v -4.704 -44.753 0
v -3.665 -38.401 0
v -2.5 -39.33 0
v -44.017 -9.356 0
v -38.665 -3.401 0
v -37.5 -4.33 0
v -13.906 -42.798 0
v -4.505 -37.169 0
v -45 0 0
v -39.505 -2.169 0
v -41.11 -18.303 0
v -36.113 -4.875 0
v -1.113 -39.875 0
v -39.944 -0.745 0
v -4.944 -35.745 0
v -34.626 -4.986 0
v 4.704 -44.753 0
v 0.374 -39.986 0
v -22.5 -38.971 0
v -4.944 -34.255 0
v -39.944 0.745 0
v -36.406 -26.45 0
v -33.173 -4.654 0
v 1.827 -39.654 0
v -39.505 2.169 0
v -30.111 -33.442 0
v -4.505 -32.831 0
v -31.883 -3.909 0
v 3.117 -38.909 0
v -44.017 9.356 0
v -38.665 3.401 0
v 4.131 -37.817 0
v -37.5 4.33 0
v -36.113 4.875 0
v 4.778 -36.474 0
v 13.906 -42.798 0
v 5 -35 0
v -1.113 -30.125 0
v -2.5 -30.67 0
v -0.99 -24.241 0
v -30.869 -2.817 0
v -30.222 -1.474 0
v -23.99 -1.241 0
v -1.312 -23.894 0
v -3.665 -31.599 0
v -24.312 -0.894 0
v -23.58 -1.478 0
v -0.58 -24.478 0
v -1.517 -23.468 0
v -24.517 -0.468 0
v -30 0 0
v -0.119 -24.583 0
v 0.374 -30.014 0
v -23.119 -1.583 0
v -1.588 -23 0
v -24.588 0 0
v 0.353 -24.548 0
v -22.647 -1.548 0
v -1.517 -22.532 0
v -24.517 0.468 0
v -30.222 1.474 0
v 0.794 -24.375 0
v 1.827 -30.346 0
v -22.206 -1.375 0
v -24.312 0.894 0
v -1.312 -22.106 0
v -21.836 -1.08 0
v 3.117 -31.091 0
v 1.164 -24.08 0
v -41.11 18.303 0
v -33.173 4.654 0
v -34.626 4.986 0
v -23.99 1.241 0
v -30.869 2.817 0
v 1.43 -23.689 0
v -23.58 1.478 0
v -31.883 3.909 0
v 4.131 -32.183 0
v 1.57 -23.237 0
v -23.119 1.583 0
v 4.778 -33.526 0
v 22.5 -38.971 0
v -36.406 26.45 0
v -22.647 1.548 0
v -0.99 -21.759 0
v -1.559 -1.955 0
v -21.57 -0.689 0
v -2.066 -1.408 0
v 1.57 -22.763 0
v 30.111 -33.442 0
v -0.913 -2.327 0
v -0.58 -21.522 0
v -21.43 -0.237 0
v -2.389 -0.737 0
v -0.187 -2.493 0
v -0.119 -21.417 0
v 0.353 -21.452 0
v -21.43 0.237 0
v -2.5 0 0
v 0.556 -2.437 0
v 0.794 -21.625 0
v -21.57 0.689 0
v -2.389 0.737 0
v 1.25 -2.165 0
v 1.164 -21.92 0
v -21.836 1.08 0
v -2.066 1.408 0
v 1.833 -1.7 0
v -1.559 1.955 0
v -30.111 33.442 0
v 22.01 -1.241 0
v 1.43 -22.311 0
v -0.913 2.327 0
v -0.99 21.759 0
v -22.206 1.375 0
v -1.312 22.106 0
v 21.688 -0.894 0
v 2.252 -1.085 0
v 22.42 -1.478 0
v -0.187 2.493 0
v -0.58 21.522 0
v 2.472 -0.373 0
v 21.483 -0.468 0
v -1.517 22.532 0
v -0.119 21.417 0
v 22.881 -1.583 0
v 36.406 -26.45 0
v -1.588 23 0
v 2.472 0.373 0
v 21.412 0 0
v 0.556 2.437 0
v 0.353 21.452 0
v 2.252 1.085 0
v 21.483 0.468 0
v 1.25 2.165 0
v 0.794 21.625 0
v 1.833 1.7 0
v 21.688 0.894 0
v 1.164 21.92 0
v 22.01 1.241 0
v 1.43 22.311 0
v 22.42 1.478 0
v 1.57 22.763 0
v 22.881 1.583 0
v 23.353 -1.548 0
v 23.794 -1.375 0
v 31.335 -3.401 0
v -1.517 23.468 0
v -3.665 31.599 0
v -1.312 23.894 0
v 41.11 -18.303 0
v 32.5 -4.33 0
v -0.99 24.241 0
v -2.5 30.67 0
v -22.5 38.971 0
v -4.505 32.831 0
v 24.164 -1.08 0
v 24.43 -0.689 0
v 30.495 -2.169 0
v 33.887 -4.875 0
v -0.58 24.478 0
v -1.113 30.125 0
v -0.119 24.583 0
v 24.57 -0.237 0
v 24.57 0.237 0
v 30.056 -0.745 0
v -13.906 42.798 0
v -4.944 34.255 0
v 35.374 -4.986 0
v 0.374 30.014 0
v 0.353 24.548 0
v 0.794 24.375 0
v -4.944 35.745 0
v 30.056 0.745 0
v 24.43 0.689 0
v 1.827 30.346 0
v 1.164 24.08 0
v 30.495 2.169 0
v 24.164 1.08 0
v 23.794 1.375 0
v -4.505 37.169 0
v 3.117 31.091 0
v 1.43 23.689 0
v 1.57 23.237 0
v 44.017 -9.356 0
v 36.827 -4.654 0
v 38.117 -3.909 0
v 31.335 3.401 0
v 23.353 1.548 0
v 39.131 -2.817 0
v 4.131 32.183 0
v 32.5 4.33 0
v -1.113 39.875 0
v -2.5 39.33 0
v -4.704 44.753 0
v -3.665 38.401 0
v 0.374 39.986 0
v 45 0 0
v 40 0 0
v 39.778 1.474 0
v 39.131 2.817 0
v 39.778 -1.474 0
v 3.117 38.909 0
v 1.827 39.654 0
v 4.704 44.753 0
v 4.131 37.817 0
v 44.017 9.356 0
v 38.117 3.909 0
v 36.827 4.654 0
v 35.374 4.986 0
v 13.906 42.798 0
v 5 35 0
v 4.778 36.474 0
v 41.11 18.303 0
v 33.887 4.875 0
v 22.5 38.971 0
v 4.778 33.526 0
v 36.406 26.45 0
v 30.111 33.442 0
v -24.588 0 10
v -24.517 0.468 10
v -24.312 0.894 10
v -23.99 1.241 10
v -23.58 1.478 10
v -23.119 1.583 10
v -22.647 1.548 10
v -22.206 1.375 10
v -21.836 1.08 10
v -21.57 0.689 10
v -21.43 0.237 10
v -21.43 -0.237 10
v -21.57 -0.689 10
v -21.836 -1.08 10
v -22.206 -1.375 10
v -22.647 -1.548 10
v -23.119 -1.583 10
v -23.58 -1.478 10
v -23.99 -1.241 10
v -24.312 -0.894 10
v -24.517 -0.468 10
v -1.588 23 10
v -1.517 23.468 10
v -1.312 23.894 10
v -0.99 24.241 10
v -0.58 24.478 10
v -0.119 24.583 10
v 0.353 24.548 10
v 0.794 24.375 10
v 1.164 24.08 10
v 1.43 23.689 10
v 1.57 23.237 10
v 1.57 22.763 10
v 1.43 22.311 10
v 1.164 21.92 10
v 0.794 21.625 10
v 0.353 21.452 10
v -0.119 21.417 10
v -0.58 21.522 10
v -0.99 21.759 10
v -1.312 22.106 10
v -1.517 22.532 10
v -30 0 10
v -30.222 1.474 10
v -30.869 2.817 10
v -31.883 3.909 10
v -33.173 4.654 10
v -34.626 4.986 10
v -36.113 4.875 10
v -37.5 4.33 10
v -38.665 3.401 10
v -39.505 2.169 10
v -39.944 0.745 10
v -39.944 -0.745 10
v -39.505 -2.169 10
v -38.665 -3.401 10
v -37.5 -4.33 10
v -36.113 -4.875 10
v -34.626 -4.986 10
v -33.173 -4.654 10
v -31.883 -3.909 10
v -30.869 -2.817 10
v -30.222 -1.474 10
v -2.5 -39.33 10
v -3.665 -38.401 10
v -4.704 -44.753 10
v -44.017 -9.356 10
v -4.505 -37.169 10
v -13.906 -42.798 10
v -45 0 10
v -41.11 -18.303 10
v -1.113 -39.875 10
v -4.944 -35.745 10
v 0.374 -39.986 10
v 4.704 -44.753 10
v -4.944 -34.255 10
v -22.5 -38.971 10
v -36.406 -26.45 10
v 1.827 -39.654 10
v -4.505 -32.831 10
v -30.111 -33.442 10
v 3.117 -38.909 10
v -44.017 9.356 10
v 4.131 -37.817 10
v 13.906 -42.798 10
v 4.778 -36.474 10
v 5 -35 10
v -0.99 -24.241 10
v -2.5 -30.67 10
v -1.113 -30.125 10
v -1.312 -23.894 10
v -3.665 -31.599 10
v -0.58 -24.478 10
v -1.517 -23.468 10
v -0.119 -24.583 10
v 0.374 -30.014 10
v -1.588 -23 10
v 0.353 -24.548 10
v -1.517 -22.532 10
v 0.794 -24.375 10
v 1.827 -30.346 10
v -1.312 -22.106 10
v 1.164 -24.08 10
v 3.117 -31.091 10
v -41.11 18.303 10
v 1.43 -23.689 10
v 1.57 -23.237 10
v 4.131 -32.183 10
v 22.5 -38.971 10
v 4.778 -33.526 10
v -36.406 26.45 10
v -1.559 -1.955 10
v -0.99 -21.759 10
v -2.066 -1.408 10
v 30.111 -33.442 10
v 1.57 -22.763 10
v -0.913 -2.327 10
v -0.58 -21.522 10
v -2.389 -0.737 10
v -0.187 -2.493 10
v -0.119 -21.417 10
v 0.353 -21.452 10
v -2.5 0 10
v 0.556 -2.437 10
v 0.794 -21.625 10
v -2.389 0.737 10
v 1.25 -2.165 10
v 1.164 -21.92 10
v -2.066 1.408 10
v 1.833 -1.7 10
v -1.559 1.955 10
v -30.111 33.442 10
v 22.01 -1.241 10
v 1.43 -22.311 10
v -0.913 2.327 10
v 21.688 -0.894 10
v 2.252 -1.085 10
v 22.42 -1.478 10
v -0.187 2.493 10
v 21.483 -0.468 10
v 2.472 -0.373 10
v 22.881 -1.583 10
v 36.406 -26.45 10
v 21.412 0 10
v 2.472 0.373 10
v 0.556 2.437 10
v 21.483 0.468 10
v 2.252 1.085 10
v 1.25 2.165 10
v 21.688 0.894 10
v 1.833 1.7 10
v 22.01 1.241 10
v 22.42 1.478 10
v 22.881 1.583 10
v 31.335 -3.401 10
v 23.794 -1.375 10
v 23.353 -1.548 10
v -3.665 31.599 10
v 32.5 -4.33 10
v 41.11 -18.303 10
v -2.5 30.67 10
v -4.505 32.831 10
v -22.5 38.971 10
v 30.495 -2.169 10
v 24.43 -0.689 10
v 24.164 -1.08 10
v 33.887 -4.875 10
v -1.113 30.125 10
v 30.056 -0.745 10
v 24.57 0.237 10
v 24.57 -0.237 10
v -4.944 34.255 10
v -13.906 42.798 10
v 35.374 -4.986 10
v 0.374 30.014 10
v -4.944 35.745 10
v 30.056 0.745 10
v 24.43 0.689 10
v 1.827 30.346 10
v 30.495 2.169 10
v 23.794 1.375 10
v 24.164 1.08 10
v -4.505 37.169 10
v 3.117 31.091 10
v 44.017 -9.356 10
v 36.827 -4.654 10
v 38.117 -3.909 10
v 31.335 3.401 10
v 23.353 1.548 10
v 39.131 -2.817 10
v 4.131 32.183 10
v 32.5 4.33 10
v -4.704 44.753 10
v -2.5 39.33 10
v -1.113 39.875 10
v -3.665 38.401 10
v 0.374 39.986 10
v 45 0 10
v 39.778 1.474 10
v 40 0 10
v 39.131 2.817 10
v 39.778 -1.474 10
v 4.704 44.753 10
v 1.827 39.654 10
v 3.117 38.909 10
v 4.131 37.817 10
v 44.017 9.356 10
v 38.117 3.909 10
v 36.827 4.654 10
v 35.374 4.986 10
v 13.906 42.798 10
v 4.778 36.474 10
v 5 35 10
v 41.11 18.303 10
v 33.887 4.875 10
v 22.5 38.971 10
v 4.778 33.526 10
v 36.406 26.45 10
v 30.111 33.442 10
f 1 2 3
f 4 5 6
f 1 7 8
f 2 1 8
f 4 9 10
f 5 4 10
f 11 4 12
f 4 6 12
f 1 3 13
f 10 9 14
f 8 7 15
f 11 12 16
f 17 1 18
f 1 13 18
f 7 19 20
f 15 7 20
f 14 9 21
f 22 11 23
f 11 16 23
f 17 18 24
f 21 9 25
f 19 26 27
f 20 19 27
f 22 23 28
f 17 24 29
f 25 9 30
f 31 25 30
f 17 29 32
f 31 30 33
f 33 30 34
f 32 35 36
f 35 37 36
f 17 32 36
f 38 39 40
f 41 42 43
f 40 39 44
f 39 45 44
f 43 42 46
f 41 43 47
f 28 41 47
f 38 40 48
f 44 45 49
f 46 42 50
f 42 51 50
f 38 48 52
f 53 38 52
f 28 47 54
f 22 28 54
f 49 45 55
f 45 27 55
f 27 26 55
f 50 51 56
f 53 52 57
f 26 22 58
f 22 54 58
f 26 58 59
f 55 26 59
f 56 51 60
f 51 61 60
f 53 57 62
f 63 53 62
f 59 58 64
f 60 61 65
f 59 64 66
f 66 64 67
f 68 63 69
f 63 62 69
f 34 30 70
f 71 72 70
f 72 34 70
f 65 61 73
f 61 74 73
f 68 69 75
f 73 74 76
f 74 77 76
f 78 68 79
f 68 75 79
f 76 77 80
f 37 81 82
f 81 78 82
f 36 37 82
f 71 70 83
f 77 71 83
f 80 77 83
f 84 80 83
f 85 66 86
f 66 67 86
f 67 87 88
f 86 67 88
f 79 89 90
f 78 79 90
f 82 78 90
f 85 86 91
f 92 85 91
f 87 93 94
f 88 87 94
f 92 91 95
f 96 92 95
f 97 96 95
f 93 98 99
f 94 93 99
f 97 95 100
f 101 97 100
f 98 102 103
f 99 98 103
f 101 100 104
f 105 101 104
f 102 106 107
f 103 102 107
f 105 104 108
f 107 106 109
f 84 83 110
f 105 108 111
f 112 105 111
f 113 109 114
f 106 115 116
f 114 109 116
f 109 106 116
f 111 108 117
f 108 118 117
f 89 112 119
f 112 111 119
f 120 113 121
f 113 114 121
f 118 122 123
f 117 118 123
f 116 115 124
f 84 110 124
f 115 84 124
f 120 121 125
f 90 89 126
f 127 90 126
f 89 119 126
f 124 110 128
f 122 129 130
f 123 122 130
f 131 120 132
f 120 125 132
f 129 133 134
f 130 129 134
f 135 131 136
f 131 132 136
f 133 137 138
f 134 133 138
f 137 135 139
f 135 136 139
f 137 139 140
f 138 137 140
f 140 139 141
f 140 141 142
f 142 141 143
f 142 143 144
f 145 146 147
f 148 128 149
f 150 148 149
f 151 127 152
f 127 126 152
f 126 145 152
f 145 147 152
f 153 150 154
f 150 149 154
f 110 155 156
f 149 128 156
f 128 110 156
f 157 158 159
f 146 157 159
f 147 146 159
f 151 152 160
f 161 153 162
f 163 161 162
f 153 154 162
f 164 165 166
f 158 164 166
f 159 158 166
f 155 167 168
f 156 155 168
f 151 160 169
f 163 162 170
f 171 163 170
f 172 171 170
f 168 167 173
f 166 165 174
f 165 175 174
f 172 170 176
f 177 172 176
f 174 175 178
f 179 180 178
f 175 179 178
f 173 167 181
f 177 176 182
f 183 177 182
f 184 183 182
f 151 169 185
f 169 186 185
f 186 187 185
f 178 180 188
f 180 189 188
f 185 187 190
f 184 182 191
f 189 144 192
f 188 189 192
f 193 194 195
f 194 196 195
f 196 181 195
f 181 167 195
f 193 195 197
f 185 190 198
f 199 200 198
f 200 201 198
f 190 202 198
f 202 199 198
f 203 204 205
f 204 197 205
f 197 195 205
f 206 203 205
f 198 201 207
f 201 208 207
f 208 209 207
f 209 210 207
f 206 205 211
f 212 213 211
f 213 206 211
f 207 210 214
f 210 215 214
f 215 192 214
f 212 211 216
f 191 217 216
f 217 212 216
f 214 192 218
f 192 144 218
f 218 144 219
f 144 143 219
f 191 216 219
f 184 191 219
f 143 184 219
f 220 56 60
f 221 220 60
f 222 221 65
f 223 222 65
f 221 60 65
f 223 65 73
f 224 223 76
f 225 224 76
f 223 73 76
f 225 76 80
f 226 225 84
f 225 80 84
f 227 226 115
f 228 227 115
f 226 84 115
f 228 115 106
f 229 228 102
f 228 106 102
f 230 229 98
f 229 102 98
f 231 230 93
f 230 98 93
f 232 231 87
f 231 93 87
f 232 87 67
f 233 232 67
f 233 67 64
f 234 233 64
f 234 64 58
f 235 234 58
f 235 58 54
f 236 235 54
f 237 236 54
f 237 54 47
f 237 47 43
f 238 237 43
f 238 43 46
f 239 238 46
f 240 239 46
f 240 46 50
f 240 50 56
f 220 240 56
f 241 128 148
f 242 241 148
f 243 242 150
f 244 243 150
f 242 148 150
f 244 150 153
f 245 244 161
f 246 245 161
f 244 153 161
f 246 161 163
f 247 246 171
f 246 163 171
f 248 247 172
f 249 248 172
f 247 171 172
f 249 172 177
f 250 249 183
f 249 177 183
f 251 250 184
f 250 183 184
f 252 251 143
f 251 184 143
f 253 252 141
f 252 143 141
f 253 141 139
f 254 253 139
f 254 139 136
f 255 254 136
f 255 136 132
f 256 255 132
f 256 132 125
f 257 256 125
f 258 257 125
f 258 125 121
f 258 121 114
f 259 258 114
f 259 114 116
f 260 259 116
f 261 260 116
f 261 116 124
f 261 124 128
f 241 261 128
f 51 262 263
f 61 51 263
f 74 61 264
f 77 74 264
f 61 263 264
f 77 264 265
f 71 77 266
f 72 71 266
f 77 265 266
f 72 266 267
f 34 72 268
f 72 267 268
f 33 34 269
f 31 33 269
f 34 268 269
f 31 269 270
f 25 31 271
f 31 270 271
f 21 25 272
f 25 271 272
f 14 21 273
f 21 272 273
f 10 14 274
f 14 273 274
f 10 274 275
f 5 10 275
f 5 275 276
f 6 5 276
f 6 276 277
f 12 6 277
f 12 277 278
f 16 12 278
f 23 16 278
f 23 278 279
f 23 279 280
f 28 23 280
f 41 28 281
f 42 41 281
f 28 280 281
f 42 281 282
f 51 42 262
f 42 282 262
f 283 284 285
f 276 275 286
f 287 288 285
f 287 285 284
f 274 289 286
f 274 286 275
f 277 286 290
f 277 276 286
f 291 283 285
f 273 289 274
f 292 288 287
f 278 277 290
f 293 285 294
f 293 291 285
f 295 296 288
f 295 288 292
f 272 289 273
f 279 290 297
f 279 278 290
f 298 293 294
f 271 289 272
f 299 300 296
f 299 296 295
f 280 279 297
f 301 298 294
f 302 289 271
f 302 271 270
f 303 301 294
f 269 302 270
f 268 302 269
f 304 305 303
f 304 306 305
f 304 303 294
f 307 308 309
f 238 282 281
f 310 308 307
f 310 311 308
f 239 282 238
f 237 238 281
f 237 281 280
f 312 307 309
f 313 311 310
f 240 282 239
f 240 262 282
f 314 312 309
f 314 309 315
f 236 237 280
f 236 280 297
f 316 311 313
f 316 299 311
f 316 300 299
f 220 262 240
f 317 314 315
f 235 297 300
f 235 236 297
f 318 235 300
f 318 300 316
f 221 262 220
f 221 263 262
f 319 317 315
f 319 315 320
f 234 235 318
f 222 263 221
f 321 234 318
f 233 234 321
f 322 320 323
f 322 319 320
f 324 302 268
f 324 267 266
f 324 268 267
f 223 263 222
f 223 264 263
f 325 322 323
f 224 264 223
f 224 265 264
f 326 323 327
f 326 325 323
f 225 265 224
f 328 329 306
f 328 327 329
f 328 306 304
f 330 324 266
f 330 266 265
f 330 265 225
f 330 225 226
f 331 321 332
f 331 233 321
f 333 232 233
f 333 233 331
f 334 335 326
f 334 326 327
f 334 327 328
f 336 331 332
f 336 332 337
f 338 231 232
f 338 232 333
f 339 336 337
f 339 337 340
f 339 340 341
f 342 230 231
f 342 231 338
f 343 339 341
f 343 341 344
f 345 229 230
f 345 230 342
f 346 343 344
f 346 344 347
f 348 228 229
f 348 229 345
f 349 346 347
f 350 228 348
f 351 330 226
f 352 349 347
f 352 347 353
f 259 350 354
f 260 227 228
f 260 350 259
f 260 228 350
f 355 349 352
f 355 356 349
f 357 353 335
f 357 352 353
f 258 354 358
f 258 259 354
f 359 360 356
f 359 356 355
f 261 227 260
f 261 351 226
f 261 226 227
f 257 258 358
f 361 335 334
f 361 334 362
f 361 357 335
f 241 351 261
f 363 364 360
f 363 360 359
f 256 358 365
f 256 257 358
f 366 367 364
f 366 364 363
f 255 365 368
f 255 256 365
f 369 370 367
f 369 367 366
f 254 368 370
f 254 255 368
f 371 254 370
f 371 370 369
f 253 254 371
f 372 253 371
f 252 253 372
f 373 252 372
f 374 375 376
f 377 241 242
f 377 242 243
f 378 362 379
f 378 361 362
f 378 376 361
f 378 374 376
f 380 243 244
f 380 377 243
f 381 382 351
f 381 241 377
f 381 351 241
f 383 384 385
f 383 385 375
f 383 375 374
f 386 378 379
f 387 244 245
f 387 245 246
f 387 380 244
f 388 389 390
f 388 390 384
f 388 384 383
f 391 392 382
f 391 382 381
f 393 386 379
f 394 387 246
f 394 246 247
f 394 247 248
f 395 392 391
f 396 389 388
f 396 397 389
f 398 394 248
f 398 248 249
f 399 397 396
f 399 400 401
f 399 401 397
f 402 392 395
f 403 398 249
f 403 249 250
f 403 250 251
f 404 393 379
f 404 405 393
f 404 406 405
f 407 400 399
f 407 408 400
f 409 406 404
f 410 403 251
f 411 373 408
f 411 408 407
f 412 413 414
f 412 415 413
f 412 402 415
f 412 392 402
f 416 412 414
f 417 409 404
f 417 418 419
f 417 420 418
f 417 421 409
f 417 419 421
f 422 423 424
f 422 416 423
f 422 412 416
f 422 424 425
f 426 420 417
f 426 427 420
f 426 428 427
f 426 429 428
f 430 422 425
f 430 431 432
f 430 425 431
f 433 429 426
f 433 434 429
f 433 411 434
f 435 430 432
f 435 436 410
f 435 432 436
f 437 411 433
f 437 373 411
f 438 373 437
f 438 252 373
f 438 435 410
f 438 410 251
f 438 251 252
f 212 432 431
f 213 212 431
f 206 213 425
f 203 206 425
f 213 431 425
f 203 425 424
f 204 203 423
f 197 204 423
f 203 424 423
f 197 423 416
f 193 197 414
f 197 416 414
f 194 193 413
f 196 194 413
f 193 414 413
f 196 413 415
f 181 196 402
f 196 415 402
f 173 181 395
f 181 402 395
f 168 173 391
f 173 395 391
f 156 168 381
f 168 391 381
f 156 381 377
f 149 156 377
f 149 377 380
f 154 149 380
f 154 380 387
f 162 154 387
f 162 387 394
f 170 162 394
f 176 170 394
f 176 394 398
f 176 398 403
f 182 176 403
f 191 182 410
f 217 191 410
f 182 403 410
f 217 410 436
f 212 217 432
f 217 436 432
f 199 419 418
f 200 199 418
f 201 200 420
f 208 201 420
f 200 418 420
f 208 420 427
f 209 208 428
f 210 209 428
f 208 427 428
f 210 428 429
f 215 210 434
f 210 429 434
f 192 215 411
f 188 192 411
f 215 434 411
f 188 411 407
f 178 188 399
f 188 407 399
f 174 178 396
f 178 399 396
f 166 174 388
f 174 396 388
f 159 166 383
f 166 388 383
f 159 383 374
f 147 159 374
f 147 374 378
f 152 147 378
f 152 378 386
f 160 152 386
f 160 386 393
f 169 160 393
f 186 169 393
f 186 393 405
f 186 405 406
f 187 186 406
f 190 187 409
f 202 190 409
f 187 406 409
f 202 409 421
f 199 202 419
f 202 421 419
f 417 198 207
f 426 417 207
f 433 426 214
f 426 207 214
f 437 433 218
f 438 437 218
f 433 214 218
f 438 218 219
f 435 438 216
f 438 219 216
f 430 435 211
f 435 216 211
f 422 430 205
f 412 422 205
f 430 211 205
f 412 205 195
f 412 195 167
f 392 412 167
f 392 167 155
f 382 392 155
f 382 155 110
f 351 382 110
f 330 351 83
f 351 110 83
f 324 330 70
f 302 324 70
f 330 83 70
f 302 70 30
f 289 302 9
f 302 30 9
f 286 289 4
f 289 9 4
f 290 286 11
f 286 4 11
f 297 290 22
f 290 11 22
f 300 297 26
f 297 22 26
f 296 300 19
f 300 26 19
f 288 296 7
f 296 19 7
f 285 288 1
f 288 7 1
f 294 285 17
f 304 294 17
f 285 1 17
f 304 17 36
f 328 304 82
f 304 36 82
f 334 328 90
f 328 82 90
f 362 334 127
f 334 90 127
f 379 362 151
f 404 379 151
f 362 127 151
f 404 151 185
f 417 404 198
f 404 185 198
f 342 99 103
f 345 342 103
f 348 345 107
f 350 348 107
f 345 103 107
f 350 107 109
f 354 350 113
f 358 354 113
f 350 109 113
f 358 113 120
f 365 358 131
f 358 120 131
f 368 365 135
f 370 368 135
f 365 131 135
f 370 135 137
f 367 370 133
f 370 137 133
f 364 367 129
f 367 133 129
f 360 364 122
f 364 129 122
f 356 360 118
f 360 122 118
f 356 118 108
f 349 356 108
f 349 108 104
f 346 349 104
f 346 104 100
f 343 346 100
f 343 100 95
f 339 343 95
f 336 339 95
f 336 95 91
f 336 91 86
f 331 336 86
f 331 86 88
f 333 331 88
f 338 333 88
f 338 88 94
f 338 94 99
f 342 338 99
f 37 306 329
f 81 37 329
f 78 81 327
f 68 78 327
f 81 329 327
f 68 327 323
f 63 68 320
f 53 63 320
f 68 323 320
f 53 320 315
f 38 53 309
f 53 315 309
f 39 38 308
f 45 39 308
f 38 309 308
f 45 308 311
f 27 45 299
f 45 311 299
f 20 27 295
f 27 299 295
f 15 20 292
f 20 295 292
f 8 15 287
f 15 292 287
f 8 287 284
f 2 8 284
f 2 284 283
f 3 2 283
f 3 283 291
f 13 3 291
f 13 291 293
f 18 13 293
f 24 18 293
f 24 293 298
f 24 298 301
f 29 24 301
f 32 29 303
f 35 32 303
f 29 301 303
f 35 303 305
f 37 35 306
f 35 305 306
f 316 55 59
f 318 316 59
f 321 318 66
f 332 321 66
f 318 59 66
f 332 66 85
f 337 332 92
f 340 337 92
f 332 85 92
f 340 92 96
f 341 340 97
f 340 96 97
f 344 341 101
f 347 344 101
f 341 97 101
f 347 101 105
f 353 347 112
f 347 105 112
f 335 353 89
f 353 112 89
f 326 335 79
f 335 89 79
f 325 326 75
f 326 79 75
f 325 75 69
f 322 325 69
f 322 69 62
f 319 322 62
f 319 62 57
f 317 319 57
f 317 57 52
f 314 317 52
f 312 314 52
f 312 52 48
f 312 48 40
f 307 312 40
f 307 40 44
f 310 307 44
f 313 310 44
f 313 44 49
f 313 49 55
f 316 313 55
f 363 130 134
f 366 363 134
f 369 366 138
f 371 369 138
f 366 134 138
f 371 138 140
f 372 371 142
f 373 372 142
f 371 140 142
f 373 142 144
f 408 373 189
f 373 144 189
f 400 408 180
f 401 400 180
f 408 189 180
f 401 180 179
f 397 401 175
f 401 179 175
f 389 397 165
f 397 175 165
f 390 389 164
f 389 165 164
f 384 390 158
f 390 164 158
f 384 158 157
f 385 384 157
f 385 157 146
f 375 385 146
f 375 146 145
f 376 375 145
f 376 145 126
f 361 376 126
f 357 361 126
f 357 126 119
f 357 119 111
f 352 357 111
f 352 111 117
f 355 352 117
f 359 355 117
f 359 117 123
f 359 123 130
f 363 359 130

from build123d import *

# Parameters (mm, degrees)
SKETCH2_R                    = 45
BOSS_EXTRUDE1_DEPTH          = 10
SKETCH3_R                    = 2.5
CUT_EXTRUDE1_DEPTH           = 65.420493634
SKETCH4_R                    = 5
CUT_EXTRUDE2_DEPTH           = 10
F_1_8_0_125_DIAMETER_HOLE1_D = 3.175


with BuildPart() as part:
    # Sketch2 → Boss-Extrude1 (new body)
    with BuildSketch(Plane.XY):
        Circle(SKETCH2_R)
    extrude(amount=BOSS_EXTRUDE1_DEPTH)

    # Sketch3 → Cut-Extrude1 (cut, through all)
    with BuildSketch(Plane(origin=(0, 0, 0), x_dir=(-1, 0, 0), z_dir=(0, 0, -1))):
        Circle(SKETCH3_R)
    extrude(amount=-CUT_EXTRUDE1_DEPTH, mode=Mode.SUBTRACT)

    # Sketch4 → Cut-Extrude2 (cut)
    with BuildSketch(Plane.XY.offset(10)):
        with Locations((0, 35)):
            Circle(SKETCH4_R)
        with Locations((35, 0)):
            Circle(SKETCH4_R)
        with Locations((0, -35)):
            Circle(SKETCH4_R)
        with Locations((-35, 0)):
            Circle(SKETCH4_R)
    extrude(amount=-CUT_EXTRUDE2_DEPTH, mode=Mode.SUBTRACT)

    # 1/8 (0.125) Diameter Hole1 (through all)
    with Locations(Plane.XY.offset(10)):
        with Locations((0, 23), (23, 0), (0, -23), (-23, 0)):
            Hole(F_1_8_0_125_DIAMETER_HOLE1_D / 2)


solid = part.part
